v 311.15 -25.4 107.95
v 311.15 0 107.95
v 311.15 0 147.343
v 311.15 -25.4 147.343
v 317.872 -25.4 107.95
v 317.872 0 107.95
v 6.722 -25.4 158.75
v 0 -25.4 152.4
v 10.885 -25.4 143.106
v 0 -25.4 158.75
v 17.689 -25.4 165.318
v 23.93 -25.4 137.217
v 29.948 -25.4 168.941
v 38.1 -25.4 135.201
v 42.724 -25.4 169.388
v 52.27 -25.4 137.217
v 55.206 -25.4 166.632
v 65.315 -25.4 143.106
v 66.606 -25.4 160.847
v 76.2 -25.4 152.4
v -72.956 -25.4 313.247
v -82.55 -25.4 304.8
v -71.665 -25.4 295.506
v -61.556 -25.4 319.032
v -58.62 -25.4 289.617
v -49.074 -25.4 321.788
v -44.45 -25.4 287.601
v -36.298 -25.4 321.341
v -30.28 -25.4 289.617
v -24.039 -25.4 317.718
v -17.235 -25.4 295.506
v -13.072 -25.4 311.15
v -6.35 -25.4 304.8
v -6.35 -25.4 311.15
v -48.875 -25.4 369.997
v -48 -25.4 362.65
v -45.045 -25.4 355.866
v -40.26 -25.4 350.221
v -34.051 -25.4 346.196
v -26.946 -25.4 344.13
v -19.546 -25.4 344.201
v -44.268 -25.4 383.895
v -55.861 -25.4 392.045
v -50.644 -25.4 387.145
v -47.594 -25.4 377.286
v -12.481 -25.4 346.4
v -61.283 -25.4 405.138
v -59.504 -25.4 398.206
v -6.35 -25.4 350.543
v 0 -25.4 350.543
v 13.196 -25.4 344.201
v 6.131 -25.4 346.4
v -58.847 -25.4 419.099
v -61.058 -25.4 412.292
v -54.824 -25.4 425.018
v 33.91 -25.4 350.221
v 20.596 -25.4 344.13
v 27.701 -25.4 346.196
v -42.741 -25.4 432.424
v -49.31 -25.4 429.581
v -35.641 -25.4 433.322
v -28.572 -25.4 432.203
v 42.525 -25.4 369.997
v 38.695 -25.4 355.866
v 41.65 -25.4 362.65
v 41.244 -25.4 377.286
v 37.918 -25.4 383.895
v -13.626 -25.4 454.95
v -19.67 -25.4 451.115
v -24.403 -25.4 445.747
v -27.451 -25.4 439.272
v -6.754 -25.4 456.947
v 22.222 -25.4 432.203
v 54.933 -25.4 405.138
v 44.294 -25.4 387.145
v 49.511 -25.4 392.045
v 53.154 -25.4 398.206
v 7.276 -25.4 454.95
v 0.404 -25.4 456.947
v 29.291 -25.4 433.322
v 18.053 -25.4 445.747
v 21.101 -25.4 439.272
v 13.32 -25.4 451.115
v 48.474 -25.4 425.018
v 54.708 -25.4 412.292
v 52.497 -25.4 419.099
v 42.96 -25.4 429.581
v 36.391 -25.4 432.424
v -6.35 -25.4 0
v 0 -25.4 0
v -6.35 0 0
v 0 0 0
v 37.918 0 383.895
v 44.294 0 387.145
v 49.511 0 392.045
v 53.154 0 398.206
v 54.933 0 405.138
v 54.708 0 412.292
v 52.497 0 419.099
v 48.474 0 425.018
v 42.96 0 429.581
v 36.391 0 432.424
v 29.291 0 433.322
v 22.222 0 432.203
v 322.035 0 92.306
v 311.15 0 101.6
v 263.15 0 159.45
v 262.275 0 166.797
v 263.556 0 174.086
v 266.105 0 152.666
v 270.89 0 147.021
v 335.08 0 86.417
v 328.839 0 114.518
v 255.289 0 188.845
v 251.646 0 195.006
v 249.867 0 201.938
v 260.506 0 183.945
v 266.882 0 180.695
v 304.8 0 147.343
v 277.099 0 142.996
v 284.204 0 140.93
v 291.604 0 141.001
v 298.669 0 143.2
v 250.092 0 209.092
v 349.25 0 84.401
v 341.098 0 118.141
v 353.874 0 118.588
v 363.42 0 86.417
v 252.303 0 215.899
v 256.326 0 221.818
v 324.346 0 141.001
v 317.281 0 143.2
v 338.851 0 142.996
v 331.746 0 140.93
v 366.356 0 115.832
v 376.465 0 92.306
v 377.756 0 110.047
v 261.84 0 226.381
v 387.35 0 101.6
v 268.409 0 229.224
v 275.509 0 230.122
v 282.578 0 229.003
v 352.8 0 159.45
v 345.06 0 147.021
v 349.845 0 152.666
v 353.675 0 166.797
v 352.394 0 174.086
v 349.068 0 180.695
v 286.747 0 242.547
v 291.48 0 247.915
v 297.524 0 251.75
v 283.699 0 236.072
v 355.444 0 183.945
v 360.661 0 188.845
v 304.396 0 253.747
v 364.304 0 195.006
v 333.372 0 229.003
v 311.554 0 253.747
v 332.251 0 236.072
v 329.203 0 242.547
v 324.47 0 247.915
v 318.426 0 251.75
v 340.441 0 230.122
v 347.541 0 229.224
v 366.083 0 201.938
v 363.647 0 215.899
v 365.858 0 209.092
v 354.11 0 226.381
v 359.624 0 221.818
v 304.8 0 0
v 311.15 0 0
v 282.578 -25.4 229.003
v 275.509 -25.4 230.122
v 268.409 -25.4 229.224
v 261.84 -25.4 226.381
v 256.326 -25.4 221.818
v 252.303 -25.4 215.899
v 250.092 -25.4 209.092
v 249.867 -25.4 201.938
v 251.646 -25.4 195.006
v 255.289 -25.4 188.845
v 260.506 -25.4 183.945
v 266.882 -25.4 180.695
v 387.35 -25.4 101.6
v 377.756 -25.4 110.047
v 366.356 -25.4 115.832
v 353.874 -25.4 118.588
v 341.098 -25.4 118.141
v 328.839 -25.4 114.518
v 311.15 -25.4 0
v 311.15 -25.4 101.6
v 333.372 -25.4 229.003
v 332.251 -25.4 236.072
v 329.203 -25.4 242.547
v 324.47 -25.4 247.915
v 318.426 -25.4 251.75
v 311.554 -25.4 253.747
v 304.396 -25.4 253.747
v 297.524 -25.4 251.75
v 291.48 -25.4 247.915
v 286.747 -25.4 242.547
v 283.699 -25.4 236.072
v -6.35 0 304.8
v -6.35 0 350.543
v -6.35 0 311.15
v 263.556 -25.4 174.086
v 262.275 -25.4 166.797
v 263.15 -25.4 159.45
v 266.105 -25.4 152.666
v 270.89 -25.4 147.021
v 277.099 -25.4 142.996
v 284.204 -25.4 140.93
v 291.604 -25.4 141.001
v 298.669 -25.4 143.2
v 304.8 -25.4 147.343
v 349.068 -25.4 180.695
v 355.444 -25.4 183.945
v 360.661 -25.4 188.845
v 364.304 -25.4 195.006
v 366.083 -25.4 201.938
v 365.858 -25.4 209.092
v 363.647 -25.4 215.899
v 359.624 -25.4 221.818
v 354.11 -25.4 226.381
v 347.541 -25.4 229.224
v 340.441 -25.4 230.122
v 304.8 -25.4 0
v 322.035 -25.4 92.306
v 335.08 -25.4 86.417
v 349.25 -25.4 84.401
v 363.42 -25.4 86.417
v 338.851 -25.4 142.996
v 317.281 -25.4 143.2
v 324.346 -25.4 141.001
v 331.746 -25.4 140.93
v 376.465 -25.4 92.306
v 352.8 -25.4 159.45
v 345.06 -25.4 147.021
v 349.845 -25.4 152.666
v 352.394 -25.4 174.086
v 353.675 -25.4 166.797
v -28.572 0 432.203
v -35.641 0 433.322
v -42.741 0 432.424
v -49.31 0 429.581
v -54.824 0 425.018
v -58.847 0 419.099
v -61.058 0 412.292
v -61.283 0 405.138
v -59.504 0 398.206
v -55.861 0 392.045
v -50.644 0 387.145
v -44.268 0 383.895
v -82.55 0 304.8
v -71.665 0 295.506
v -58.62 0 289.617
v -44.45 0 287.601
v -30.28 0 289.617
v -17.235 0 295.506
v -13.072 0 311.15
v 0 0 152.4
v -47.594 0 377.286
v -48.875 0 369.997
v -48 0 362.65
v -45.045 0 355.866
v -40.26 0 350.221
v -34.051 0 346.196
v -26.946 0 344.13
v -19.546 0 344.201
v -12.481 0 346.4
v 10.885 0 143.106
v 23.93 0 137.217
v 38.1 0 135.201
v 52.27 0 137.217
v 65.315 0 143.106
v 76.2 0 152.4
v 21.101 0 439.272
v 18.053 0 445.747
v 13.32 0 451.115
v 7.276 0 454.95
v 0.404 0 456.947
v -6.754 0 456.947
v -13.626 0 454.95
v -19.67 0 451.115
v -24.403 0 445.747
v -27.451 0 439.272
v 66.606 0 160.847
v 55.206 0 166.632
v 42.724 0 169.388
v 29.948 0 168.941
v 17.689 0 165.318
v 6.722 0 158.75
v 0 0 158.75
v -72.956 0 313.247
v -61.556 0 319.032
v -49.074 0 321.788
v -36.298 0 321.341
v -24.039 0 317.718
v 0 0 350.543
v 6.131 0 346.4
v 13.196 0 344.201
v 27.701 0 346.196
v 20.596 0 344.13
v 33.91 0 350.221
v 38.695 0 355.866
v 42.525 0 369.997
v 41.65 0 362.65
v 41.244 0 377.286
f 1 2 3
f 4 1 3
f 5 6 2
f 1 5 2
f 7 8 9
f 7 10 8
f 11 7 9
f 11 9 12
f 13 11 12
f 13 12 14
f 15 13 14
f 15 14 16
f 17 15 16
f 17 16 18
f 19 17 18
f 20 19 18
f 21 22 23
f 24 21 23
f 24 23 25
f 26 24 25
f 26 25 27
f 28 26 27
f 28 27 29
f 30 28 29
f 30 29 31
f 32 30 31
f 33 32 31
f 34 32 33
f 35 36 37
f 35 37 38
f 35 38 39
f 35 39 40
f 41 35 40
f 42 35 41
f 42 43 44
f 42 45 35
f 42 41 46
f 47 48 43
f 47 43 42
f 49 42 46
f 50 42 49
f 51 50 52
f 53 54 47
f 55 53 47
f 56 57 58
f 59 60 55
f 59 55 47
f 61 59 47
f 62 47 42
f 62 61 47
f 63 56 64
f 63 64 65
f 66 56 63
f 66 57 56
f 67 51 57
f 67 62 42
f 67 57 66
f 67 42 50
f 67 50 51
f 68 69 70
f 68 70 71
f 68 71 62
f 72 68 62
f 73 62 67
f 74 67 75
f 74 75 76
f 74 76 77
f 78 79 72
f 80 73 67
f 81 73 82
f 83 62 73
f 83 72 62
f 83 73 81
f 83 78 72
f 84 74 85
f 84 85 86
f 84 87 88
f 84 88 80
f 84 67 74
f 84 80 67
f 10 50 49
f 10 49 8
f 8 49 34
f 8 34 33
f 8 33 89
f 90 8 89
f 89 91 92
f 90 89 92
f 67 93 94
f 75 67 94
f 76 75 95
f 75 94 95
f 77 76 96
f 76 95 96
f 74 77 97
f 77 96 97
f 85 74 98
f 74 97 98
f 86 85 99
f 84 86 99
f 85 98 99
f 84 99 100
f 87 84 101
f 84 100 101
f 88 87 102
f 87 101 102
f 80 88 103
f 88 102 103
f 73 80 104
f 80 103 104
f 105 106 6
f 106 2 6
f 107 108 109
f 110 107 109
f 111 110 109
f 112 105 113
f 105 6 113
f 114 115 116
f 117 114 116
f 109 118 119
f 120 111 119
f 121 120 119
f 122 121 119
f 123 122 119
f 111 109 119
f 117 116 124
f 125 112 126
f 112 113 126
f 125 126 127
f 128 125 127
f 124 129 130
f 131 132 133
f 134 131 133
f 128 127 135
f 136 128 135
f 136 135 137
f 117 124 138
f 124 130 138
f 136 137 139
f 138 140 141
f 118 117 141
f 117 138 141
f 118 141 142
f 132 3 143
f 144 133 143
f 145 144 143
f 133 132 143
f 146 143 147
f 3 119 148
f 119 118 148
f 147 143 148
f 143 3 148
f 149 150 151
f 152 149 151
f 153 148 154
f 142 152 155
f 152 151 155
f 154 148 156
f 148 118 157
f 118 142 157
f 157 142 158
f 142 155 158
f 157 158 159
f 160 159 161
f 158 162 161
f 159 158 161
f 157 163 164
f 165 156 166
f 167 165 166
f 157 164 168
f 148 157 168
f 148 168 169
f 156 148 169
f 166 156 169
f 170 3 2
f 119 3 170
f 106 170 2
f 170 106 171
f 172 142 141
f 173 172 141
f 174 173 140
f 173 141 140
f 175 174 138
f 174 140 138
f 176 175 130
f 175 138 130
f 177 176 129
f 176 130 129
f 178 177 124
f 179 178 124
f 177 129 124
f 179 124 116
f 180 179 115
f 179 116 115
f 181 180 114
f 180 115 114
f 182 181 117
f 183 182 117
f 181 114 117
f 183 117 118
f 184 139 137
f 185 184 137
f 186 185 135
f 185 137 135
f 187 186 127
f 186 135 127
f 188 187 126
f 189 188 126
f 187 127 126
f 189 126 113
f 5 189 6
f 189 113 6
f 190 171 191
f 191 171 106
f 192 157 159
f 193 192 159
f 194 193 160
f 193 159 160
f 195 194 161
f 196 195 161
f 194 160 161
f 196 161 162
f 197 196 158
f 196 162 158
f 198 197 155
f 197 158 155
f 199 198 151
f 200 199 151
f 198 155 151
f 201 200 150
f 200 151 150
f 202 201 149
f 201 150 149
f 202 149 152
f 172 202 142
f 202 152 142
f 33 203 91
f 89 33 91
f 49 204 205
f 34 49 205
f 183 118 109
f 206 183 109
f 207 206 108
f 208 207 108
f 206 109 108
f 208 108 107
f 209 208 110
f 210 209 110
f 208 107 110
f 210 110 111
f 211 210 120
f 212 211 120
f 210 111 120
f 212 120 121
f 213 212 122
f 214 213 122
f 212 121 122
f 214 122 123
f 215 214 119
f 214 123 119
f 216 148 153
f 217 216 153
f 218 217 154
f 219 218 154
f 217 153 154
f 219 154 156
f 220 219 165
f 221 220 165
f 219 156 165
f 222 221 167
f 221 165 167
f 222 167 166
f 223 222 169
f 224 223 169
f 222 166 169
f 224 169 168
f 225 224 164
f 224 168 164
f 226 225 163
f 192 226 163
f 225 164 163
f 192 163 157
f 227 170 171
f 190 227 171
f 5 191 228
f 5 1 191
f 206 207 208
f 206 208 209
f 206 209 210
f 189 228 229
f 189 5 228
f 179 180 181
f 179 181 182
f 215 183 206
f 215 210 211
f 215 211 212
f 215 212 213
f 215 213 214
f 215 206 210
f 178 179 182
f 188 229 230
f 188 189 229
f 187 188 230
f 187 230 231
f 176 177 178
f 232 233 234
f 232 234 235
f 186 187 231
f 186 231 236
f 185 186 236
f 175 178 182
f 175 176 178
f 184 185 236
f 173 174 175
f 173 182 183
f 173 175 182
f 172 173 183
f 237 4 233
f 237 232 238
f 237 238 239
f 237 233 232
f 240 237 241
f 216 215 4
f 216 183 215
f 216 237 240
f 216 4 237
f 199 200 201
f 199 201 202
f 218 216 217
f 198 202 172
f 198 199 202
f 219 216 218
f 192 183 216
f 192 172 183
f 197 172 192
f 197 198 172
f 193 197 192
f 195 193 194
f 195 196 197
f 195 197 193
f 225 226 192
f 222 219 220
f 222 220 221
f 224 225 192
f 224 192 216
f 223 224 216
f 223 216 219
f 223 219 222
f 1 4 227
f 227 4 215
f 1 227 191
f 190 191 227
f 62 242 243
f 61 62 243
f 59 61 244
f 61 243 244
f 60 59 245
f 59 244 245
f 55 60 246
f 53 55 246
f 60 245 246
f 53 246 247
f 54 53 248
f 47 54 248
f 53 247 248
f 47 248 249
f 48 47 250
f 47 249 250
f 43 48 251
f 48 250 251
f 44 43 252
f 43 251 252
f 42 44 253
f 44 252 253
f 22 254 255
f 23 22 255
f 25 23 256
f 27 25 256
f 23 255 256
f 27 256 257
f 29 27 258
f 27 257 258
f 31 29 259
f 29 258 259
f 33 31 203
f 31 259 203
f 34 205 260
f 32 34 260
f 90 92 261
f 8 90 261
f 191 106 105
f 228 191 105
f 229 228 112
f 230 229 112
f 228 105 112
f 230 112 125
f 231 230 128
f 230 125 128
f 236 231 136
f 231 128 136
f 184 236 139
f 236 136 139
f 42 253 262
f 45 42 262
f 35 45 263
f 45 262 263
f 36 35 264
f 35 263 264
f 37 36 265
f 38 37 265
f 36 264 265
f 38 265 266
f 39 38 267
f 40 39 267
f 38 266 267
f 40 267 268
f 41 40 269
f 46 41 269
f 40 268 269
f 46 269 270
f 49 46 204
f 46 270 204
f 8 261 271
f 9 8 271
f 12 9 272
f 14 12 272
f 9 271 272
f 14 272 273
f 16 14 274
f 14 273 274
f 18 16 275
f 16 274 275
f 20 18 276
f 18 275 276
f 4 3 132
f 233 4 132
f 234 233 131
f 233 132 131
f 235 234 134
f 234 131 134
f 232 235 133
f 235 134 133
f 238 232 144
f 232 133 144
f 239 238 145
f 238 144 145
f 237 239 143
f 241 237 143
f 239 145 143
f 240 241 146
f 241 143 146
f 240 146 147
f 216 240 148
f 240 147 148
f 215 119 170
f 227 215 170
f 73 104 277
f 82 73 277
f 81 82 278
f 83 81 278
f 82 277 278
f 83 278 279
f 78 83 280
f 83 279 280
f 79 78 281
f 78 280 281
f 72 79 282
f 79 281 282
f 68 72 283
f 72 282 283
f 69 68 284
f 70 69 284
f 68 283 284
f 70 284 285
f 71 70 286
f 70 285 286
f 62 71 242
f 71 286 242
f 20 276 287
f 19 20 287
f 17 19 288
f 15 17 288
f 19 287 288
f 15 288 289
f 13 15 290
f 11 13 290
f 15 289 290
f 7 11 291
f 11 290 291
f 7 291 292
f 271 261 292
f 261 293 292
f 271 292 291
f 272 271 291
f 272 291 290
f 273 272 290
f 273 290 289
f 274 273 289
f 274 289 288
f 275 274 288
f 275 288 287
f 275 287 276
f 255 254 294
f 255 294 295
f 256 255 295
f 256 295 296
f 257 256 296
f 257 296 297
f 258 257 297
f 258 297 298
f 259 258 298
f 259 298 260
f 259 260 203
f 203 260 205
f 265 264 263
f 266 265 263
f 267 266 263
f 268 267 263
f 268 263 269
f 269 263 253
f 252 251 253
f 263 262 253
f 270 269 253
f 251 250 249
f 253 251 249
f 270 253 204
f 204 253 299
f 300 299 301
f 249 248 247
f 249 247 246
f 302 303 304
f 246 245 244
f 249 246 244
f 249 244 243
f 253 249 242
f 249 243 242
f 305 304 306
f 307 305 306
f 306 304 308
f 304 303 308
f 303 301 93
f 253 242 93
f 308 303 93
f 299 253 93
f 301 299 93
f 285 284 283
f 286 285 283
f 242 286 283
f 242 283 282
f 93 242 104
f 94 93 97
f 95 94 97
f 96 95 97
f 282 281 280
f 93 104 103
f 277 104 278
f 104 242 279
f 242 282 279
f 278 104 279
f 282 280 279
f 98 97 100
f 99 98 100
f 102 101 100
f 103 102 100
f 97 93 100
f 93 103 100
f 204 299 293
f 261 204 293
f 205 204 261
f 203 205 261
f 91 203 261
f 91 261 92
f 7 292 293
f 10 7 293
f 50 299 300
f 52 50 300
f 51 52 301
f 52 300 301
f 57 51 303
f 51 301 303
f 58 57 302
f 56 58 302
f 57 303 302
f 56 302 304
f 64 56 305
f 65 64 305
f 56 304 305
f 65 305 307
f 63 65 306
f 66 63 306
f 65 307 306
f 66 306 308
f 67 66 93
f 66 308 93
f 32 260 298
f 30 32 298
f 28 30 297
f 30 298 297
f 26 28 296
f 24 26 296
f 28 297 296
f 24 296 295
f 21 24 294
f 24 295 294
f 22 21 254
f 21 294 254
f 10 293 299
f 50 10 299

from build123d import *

# Parameters (mm, degrees)
F1_DEPTH = 25.4


with BuildPart() as f1:
    # F0 (on Front) → F1 (new body)
    with BuildSketch(Plane.XZ):
        with BuildLine():
            ThreePointArc((-44.2678929043, 383.8952975035), (-40.260109895, 350.2213176653), (-6.35, 350.5433265189))
            Line((-6.35, 350.5433265189), (-6.35, 359.6170129621))
            ThreePointArc((-6.35, 359.6170129621), (-8.2653665538, 369.2933754965), (-6.35, 378.9697380309))
            ThreePointArc((-6.35, 378.9697380309), (-4.9393657292, 381.8591448881), (-3.175, 384.5471877833))
            ThreePointArc((-3.175, 384.5471877833), (-1.4106342708, 381.8591448881), (0, 378.9697380309))
            ThreePointArc((0, 378.9697380309), (1.9153665538, 369.2933754965), (0, 359.6170129621))
            Line((0, 359.6170129621), (0, 350.5433265189))
            ThreePointArc((0, 350.5433265189), (33.910109895, 350.2213176653), (37.9178929043, 383.8952975035))
            ThreePointArc((37.9178929043, 383.8952975035), (53.8435127289, 415.7736256188), (22.2218045109, 432.2028903499))
            ThreePointArc((22.2218045109, 432.2028903499), (-3.175, 457.2), (-28.5718045109, 432.2028903499))
            ThreePointArc((-28.5718045109, 432.2028903499), (-60.1935127289, 415.7736256188), (-44.2678929043, 383.8952975035))
        make_face()
        with BuildLine():
            ThreePointArc((-15.2534177569, 393.3226719547), (-28.1876455579, 383.7677584478), (-44.2678929043, 383.8952975035))
            ThreePointArc((-44.2678929043, 383.8952975035), (-31.3336651033, 393.4502110104), (-15.2534177569, 393.3226719547))
        make_face(mode=Mode.SUBTRACT)
        with BuildLine():
            ThreePointArc((8.9034177569, 393.3226719547), (24.9836651033, 393.4502110104), (37.9178929043, 383.8952975035))
            ThreePointArc((37.9178929043, 383.8952975035), (21.8376455579, 383.7677584478), (8.9034177569, 393.3226719547))
        make_face(mode=Mode.SUBTRACT)
        with BuildLine():
            ThreePointArc((-10.6398727041, 407.5217036118), (-23.7240316571, 416.8702545918), (-28.5718045109, 432.2028903499))
            ThreePointArc((-28.5718045109, 432.2028903499), (-15.4876455579, 422.8543393699), (-10.6398727041, 407.5217036118))
        make_face(mode=Mode.SUBTRACT)
        with BuildLine():
            ThreePointArc((4.2898727041, 407.5217036118), (9.1376455579, 422.8543393699), (22.2218045109, 432.2028903499))
            ThreePointArc((22.2218045109, 432.2028903499), (17.3740316571, 416.8702545918), (4.2898727041, 407.5217036118))
        make_face(mode=Mode.SUBTRACT)
        with BuildLine():
            Line((-6.35, 304.8), (-6.35, 0))
            Line((-6.35, 0), (0, 0))
            Line((0, 0), (0, 152.4))
            Line((0, 152.4), (0, 158.75))
            Line((0, 158.75), (0, 350.5433265189))
            ThreePointArc((0, 350.5433265189), (-1.6689353248, 352.2174918745), (-3.175, 354.0395632097))
            ThreePointArc((-3.175, 354.0395632097), (-4.6810646752, 352.2174918745), (-6.35, 350.5433265189))
            Line((-6.35, 350.5433265189), (-6.35, 311.15))
            Line((-6.35, 311.15), (-6.35, 304.8))
        make_face()
        with BuildLine():
            ThreePointArc((-82.55, 304.8), (-44.45, 287.6010416505), (-6.35, 304.8))
            ThreePointArc((-6.35, 304.8), (-9.56640613, 308.1282810987), (-13.0723922034, 311.15))
            ThreePointArc((-13.0723922034, 311.15), (-49.0736635079, 321.7881047721), (-82.55, 304.8))
        make_face()
        with BuildLine():
            ThreePointArc((6.7223922034, 158.75), (3.21640613, 155.7282810987), (0, 152.4))
            ThreePointArc((0, 152.4), (38.1, 135.2010416505), (76.2, 152.4))
            ThreePointArc((76.2, 152.4), (42.7236635079, 169.3881047721), (6.7223922034, 158.75))
        make_face()
        with BuildLine():
            ThreePointArc((8.9034177569, 393.3226719547), (21.8376455579, 383.7677584478), (37.9178929043, 383.8952975035))
            ThreePointArc((37.9178929043, 383.8952975035), (24.9836651033, 393.4502110104), (8.9034177569, 393.3226719547))
        make_face()
        with BuildLine():
            ThreePointArc((4.2898727041, 407.5217036118), (17.3740316571, 416.8702545918), (22.2218045109, 432.2028903499))
            ThreePointArc((22.2218045109, 432.2028903499), (9.1376455579, 422.8543393699), (4.2898727041, 407.5217036118))
        make_face()
        with BuildLine():
            ThreePointArc((-10.6398727041, 407.5217036118), (-15.4876455579, 422.8543393699), (-28.5718045109, 432.2028903499))
            ThreePointArc((-28.5718045109, 432.2028903499), (-23.7240316571, 416.8702545918), (-10.6398727041, 407.5217036118))
        make_face()
        with BuildLine():
            ThreePointArc((-15.2534177569, 393.3226719547), (-31.3336651033, 393.4502110104), (-44.2678929043, 383.8952975035))
            ThreePointArc((-44.2678929043, 383.8952975035), (-28.1876455579, 383.7677584478), (-15.2534177569, 393.3226719547))
        make_face()
        with BuildLine():
            Line((-6.35, 378.9697380309), (-6.35, 359.6170129621))
            ThreePointArc((-6.35, 359.6170129621), (-4.9393657292, 356.7276061049), (-3.175, 354.0395632097))
            ThreePointArc((-3.175, 354.0395632097), (-1.4106342708, 356.7276061049), (0, 359.6170129621))
            Line((0, 359.6170129621), (0, 378.9697380309))
            ThreePointArc((0, 378.9697380309), (-1.4106342708, 381.8591448881), (-3.175, 384.5471877833))
            ThreePointArc((-3.175, 384.5471877833), (-4.9393657292, 381.8591448881), (-6.35, 378.9697380309))
        make_face()
        with BuildLine():
            ThreePointArc((-6.35, 378.9697380309), (-8.2653665538, 369.2933754965), (-6.35, 359.6170129621))
            Line((-6.35, 359.6170129621), (-6.35, 378.9697380309))
        make_face()
        with BuildLine():
            Line((0, 378.9697380309), (0, 359.6170129621))
            ThreePointArc((0, 359.6170129621), (1.9153665538, 369.2933754965), (0, 378.9697380309))
        make_face()
        with BuildLine():
            ThreePointArc((-13.0723922034, 311.15), (-9.56640613, 308.1282810987), (-6.35, 304.8))
            Line((-6.35, 304.8), (-6.35, 311.15))
            Line((-6.35, 311.15), (-13.0723922034, 311.15))
        make_face()
        with BuildLine():
            Line((0, 158.75), (0, 152.4))
            ThreePointArc((0, 152.4), (3.21640613, 155.7282810987), (6.7223922034, 158.75))
            Line((6.7223922034, 158.75), (0, 158.75))
        make_face()
        with BuildLine():
            Line((-6.35, 359.6170129621), (-6.35, 350.5433265189))
            ThreePointArc((-6.35, 350.5433265189), (-4.6810646752, 352.2174918745), (-3.175, 354.0395632097))
            ThreePointArc((-3.175, 354.0395632097), (-4.9393657292, 356.7276061049), (-6.35, 359.6170129621))
        make_face()
        with BuildLine():
            ThreePointArc((0, 359.6170129621), (-1.4106342708, 356.7276061049), (-3.175, 354.0395632097))
            ThreePointArc((-3.175, 354.0395632097), (-1.6689353248, 352.2174918745), (0, 350.5433265189))
            Line((0, 350.5433265189), (0, 359.6170129621))
        make_face()
    extrude(amount=F1_DEPTH)


with BuildPart() as f1b:
    # F0 (on Front) → F1, piece 2 (new body)
    with BuildSketch(Plane.XZ):
        with BuildLine():
            ThreePointArc((266.8821070957, 180.6952975035), (270.889890105, 147.0213176653), (304.8, 147.3433265189))
            Line((304.8, 147.3433265189), (304.8, 156.4170129621))
            ThreePointArc((304.8, 156.4170129621), (302.8846334462, 166.0933754965), (304.8, 175.7697380309))
            ThreePointArc((304.8, 175.7697380309), (306.2106342708, 178.6591448881), (307.975, 181.3471877833))
            ThreePointArc((307.975, 181.3471877833), (309.7393657292, 178.6591448881), (311.15, 175.7697380309))
            ThreePointArc((311.15, 175.7697380309), (313.0653665538, 166.0933754965), (311.15, 156.4170129621))
            Line((311.15, 156.4170129621), (311.15, 147.3433265189))
            ThreePointArc((311.15, 147.3433265189), (345.060109895, 147.0213176653), (349.0678929043, 180.6952975035))
            ThreePointArc((349.0678929043, 180.6952975035), (364.9935127289, 212.5736256188), (333.3718045109, 229.0028903499))
            ThreePointArc((333.3718045109, 229.0028903499), (307.975, 254), (282.5781954891, 229.0028903499))
            ThreePointArc((282.5781954891, 229.0028903499), (250.9564872711, 212.5736256188), (266.8821070957, 180.6952975035))
        make_face()
        with BuildLine():
            ThreePointArc((295.8965822431, 190.1226719547), (282.9623544421, 180.5677584478), (266.8821070957, 180.6952975035))
            ThreePointArc((266.8821070957, 180.6952975035), (279.8163348967, 190.2502110104), (295.8965822431, 190.1226719547))
        make_face(mode=Mode.SUBTRACT)
        with BuildLine():
            ThreePointArc((300.5101272959, 204.3217036118), (287.4259683429, 213.6702545918), (282.5781954891, 229.0028903499))
            ThreePointArc((282.5781954891, 229.0028903499), (295.6623544421, 219.6543393699), (300.5101272959, 204.3217036118))
        make_face(mode=Mode.SUBTRACT)
        with BuildLine():
            ThreePointArc((315.4398727041, 204.3217036118), (320.2876455579, 219.6543393699), (333.3718045109, 229.0028903499))
            ThreePointArc((333.3718045109, 229.0028903499), (328.5240316571, 213.6702545918), (315.4398727041, 204.3217036118))
        make_face(mode=Mode.SUBTRACT)
        with BuildLine():
            ThreePointArc((320.0534177569, 190.1226719547), (336.1336651033, 190.2502110104), (349.0678929043, 180.6952975035))
            ThreePointArc((349.0678929043, 180.6952975035), (332.9876455579, 180.5677584478), (320.0534177569, 190.1226719547))
        make_face(mode=Mode.SUBTRACT)
        with BuildLine():
            ThreePointArc((317.8723922034, 107.95), (314.36640613, 104.9282810987), (311.15, 101.6))
            ThreePointArc((311.15, 101.6), (349.25, 84.4010416505), (387.35, 101.6))
            ThreePointArc((387.35, 101.6), (353.8736635079, 118.5881047721), (317.8723922034, 107.95))
        make_face()
        with BuildLine():
            Line((304.8, 147.3433265189), (304.8, 0))
            Line((304.8, 0), (311.15, 0))
            Line((311.15, 0), (311.15, 101.6))
            Line((311.15, 101.6), (311.15, 107.95))
            Line((311.15, 107.95), (311.15, 147.3433265189))
            ThreePointArc((311.15, 147.3433265189), (309.4810646752, 149.0174918745), (307.975, 150.8395632097))
            ThreePointArc((307.975, 150.8395632097), (306.4689353248, 149.0174918745), (304.8, 147.3433265189))
        make_face()
        with BuildLine():
            ThreePointArc((320.0534177569, 190.1226719547), (332.9876455579, 180.5677584478), (349.0678929043, 180.6952975035))
            ThreePointArc((349.0678929043, 180.6952975035), (336.1336651033, 190.2502110104), (320.0534177569, 190.1226719547))
        make_face()
        with BuildLine():
            ThreePointArc((315.4398727041, 204.3217036118), (328.5240316571, 213.6702545918), (333.3718045109, 229.0028903499))
            ThreePointArc((333.3718045109, 229.0028903499), (320.2876455579, 219.6543393699), (315.4398727041, 204.3217036118))
        make_face()
        with BuildLine():
            ThreePointArc((300.5101272959, 204.3217036118), (295.6623544421, 219.6543393699), (282.5781954891, 229.0028903499))
            ThreePointArc((282.5781954891, 229.0028903499), (287.4259683429, 213.6702545918), (300.5101272959, 204.3217036118))
        make_face()
        with BuildLine():
            ThreePointArc((295.8965822431, 190.1226719547), (279.8163348967, 190.2502110104), (266.8821070957, 180.6952975035))
            ThreePointArc((266.8821070957, 180.6952975035), (282.9623544421, 180.5677584478), (295.8965822431, 190.1226719547))
        make_face()
        with BuildLine():
            Line((304.8, 175.7697380309), (304.8, 156.4170129621))
            ThreePointArc((304.8, 156.4170129621), (306.2106342708, 153.5276061049), (307.975, 150.8395632097))
            ThreePointArc((307.975, 150.8395632097), (309.7393657292, 153.5276061049), (311.15, 156.4170129621))
            Line((311.15, 156.4170129621), (311.15, 175.7697380309))
            ThreePointArc((311.15, 175.7697380309), (309.7393657292, 178.6591448881), (307.975, 181.3471877833))
            ThreePointArc((307.975, 181.3471877833), (306.2106342708, 178.6591448881), (304.8, 175.7697380309))
        make_face()
        with BuildLine():
            ThreePointArc((304.8, 175.7697380309), (302.8846334462, 166.0933754965), (304.8, 156.4170129621))
            Line((304.8, 156.4170129621), (304.8, 175.7697380309))
        make_face()
        with BuildLine():
            Line((311.15, 175.7697380309), (311.15, 156.4170129621))
            ThreePointArc((311.15, 156.4170129621), (313.0653665538, 166.0933754965), (311.15, 175.7697380309))
        make_face()
        with BuildLine():
            Line((311.15, 107.95), (311.15, 101.6))
            ThreePointArc((311.15, 101.6), (314.36640613, 104.9282810987), (317.8723922034, 107.95))
            Line((317.8723922034, 107.95), (311.15, 107.95))
        make_face()
        with BuildLine():
            Line((304.8, 156.4170129621), (304.8, 147.3433265189))
            ThreePointArc((304.8, 147.3433265189), (306.4689353248, 149.0174918745), (307.975, 150.8395632097))
            ThreePointArc((307.975, 150.8395632097), (306.2106342708, 153.5276061049), (304.8, 156.4170129621))
        make_face()
        with BuildLine():
            ThreePointArc((311.15, 156.4170129621), (309.7393657292, 153.5276061049), (307.975, 150.8395632097))
            ThreePointArc((307.975, 150.8395632097), (309.4810646752, 149.0174918745), (311.15, 147.3433265189))
            Line((311.15, 147.3433265189), (311.15, 156.4170129621))
        make_face()
    extrude(amount=F1_DEPTH)


solid = Compound([f1.part, f1b.part])
